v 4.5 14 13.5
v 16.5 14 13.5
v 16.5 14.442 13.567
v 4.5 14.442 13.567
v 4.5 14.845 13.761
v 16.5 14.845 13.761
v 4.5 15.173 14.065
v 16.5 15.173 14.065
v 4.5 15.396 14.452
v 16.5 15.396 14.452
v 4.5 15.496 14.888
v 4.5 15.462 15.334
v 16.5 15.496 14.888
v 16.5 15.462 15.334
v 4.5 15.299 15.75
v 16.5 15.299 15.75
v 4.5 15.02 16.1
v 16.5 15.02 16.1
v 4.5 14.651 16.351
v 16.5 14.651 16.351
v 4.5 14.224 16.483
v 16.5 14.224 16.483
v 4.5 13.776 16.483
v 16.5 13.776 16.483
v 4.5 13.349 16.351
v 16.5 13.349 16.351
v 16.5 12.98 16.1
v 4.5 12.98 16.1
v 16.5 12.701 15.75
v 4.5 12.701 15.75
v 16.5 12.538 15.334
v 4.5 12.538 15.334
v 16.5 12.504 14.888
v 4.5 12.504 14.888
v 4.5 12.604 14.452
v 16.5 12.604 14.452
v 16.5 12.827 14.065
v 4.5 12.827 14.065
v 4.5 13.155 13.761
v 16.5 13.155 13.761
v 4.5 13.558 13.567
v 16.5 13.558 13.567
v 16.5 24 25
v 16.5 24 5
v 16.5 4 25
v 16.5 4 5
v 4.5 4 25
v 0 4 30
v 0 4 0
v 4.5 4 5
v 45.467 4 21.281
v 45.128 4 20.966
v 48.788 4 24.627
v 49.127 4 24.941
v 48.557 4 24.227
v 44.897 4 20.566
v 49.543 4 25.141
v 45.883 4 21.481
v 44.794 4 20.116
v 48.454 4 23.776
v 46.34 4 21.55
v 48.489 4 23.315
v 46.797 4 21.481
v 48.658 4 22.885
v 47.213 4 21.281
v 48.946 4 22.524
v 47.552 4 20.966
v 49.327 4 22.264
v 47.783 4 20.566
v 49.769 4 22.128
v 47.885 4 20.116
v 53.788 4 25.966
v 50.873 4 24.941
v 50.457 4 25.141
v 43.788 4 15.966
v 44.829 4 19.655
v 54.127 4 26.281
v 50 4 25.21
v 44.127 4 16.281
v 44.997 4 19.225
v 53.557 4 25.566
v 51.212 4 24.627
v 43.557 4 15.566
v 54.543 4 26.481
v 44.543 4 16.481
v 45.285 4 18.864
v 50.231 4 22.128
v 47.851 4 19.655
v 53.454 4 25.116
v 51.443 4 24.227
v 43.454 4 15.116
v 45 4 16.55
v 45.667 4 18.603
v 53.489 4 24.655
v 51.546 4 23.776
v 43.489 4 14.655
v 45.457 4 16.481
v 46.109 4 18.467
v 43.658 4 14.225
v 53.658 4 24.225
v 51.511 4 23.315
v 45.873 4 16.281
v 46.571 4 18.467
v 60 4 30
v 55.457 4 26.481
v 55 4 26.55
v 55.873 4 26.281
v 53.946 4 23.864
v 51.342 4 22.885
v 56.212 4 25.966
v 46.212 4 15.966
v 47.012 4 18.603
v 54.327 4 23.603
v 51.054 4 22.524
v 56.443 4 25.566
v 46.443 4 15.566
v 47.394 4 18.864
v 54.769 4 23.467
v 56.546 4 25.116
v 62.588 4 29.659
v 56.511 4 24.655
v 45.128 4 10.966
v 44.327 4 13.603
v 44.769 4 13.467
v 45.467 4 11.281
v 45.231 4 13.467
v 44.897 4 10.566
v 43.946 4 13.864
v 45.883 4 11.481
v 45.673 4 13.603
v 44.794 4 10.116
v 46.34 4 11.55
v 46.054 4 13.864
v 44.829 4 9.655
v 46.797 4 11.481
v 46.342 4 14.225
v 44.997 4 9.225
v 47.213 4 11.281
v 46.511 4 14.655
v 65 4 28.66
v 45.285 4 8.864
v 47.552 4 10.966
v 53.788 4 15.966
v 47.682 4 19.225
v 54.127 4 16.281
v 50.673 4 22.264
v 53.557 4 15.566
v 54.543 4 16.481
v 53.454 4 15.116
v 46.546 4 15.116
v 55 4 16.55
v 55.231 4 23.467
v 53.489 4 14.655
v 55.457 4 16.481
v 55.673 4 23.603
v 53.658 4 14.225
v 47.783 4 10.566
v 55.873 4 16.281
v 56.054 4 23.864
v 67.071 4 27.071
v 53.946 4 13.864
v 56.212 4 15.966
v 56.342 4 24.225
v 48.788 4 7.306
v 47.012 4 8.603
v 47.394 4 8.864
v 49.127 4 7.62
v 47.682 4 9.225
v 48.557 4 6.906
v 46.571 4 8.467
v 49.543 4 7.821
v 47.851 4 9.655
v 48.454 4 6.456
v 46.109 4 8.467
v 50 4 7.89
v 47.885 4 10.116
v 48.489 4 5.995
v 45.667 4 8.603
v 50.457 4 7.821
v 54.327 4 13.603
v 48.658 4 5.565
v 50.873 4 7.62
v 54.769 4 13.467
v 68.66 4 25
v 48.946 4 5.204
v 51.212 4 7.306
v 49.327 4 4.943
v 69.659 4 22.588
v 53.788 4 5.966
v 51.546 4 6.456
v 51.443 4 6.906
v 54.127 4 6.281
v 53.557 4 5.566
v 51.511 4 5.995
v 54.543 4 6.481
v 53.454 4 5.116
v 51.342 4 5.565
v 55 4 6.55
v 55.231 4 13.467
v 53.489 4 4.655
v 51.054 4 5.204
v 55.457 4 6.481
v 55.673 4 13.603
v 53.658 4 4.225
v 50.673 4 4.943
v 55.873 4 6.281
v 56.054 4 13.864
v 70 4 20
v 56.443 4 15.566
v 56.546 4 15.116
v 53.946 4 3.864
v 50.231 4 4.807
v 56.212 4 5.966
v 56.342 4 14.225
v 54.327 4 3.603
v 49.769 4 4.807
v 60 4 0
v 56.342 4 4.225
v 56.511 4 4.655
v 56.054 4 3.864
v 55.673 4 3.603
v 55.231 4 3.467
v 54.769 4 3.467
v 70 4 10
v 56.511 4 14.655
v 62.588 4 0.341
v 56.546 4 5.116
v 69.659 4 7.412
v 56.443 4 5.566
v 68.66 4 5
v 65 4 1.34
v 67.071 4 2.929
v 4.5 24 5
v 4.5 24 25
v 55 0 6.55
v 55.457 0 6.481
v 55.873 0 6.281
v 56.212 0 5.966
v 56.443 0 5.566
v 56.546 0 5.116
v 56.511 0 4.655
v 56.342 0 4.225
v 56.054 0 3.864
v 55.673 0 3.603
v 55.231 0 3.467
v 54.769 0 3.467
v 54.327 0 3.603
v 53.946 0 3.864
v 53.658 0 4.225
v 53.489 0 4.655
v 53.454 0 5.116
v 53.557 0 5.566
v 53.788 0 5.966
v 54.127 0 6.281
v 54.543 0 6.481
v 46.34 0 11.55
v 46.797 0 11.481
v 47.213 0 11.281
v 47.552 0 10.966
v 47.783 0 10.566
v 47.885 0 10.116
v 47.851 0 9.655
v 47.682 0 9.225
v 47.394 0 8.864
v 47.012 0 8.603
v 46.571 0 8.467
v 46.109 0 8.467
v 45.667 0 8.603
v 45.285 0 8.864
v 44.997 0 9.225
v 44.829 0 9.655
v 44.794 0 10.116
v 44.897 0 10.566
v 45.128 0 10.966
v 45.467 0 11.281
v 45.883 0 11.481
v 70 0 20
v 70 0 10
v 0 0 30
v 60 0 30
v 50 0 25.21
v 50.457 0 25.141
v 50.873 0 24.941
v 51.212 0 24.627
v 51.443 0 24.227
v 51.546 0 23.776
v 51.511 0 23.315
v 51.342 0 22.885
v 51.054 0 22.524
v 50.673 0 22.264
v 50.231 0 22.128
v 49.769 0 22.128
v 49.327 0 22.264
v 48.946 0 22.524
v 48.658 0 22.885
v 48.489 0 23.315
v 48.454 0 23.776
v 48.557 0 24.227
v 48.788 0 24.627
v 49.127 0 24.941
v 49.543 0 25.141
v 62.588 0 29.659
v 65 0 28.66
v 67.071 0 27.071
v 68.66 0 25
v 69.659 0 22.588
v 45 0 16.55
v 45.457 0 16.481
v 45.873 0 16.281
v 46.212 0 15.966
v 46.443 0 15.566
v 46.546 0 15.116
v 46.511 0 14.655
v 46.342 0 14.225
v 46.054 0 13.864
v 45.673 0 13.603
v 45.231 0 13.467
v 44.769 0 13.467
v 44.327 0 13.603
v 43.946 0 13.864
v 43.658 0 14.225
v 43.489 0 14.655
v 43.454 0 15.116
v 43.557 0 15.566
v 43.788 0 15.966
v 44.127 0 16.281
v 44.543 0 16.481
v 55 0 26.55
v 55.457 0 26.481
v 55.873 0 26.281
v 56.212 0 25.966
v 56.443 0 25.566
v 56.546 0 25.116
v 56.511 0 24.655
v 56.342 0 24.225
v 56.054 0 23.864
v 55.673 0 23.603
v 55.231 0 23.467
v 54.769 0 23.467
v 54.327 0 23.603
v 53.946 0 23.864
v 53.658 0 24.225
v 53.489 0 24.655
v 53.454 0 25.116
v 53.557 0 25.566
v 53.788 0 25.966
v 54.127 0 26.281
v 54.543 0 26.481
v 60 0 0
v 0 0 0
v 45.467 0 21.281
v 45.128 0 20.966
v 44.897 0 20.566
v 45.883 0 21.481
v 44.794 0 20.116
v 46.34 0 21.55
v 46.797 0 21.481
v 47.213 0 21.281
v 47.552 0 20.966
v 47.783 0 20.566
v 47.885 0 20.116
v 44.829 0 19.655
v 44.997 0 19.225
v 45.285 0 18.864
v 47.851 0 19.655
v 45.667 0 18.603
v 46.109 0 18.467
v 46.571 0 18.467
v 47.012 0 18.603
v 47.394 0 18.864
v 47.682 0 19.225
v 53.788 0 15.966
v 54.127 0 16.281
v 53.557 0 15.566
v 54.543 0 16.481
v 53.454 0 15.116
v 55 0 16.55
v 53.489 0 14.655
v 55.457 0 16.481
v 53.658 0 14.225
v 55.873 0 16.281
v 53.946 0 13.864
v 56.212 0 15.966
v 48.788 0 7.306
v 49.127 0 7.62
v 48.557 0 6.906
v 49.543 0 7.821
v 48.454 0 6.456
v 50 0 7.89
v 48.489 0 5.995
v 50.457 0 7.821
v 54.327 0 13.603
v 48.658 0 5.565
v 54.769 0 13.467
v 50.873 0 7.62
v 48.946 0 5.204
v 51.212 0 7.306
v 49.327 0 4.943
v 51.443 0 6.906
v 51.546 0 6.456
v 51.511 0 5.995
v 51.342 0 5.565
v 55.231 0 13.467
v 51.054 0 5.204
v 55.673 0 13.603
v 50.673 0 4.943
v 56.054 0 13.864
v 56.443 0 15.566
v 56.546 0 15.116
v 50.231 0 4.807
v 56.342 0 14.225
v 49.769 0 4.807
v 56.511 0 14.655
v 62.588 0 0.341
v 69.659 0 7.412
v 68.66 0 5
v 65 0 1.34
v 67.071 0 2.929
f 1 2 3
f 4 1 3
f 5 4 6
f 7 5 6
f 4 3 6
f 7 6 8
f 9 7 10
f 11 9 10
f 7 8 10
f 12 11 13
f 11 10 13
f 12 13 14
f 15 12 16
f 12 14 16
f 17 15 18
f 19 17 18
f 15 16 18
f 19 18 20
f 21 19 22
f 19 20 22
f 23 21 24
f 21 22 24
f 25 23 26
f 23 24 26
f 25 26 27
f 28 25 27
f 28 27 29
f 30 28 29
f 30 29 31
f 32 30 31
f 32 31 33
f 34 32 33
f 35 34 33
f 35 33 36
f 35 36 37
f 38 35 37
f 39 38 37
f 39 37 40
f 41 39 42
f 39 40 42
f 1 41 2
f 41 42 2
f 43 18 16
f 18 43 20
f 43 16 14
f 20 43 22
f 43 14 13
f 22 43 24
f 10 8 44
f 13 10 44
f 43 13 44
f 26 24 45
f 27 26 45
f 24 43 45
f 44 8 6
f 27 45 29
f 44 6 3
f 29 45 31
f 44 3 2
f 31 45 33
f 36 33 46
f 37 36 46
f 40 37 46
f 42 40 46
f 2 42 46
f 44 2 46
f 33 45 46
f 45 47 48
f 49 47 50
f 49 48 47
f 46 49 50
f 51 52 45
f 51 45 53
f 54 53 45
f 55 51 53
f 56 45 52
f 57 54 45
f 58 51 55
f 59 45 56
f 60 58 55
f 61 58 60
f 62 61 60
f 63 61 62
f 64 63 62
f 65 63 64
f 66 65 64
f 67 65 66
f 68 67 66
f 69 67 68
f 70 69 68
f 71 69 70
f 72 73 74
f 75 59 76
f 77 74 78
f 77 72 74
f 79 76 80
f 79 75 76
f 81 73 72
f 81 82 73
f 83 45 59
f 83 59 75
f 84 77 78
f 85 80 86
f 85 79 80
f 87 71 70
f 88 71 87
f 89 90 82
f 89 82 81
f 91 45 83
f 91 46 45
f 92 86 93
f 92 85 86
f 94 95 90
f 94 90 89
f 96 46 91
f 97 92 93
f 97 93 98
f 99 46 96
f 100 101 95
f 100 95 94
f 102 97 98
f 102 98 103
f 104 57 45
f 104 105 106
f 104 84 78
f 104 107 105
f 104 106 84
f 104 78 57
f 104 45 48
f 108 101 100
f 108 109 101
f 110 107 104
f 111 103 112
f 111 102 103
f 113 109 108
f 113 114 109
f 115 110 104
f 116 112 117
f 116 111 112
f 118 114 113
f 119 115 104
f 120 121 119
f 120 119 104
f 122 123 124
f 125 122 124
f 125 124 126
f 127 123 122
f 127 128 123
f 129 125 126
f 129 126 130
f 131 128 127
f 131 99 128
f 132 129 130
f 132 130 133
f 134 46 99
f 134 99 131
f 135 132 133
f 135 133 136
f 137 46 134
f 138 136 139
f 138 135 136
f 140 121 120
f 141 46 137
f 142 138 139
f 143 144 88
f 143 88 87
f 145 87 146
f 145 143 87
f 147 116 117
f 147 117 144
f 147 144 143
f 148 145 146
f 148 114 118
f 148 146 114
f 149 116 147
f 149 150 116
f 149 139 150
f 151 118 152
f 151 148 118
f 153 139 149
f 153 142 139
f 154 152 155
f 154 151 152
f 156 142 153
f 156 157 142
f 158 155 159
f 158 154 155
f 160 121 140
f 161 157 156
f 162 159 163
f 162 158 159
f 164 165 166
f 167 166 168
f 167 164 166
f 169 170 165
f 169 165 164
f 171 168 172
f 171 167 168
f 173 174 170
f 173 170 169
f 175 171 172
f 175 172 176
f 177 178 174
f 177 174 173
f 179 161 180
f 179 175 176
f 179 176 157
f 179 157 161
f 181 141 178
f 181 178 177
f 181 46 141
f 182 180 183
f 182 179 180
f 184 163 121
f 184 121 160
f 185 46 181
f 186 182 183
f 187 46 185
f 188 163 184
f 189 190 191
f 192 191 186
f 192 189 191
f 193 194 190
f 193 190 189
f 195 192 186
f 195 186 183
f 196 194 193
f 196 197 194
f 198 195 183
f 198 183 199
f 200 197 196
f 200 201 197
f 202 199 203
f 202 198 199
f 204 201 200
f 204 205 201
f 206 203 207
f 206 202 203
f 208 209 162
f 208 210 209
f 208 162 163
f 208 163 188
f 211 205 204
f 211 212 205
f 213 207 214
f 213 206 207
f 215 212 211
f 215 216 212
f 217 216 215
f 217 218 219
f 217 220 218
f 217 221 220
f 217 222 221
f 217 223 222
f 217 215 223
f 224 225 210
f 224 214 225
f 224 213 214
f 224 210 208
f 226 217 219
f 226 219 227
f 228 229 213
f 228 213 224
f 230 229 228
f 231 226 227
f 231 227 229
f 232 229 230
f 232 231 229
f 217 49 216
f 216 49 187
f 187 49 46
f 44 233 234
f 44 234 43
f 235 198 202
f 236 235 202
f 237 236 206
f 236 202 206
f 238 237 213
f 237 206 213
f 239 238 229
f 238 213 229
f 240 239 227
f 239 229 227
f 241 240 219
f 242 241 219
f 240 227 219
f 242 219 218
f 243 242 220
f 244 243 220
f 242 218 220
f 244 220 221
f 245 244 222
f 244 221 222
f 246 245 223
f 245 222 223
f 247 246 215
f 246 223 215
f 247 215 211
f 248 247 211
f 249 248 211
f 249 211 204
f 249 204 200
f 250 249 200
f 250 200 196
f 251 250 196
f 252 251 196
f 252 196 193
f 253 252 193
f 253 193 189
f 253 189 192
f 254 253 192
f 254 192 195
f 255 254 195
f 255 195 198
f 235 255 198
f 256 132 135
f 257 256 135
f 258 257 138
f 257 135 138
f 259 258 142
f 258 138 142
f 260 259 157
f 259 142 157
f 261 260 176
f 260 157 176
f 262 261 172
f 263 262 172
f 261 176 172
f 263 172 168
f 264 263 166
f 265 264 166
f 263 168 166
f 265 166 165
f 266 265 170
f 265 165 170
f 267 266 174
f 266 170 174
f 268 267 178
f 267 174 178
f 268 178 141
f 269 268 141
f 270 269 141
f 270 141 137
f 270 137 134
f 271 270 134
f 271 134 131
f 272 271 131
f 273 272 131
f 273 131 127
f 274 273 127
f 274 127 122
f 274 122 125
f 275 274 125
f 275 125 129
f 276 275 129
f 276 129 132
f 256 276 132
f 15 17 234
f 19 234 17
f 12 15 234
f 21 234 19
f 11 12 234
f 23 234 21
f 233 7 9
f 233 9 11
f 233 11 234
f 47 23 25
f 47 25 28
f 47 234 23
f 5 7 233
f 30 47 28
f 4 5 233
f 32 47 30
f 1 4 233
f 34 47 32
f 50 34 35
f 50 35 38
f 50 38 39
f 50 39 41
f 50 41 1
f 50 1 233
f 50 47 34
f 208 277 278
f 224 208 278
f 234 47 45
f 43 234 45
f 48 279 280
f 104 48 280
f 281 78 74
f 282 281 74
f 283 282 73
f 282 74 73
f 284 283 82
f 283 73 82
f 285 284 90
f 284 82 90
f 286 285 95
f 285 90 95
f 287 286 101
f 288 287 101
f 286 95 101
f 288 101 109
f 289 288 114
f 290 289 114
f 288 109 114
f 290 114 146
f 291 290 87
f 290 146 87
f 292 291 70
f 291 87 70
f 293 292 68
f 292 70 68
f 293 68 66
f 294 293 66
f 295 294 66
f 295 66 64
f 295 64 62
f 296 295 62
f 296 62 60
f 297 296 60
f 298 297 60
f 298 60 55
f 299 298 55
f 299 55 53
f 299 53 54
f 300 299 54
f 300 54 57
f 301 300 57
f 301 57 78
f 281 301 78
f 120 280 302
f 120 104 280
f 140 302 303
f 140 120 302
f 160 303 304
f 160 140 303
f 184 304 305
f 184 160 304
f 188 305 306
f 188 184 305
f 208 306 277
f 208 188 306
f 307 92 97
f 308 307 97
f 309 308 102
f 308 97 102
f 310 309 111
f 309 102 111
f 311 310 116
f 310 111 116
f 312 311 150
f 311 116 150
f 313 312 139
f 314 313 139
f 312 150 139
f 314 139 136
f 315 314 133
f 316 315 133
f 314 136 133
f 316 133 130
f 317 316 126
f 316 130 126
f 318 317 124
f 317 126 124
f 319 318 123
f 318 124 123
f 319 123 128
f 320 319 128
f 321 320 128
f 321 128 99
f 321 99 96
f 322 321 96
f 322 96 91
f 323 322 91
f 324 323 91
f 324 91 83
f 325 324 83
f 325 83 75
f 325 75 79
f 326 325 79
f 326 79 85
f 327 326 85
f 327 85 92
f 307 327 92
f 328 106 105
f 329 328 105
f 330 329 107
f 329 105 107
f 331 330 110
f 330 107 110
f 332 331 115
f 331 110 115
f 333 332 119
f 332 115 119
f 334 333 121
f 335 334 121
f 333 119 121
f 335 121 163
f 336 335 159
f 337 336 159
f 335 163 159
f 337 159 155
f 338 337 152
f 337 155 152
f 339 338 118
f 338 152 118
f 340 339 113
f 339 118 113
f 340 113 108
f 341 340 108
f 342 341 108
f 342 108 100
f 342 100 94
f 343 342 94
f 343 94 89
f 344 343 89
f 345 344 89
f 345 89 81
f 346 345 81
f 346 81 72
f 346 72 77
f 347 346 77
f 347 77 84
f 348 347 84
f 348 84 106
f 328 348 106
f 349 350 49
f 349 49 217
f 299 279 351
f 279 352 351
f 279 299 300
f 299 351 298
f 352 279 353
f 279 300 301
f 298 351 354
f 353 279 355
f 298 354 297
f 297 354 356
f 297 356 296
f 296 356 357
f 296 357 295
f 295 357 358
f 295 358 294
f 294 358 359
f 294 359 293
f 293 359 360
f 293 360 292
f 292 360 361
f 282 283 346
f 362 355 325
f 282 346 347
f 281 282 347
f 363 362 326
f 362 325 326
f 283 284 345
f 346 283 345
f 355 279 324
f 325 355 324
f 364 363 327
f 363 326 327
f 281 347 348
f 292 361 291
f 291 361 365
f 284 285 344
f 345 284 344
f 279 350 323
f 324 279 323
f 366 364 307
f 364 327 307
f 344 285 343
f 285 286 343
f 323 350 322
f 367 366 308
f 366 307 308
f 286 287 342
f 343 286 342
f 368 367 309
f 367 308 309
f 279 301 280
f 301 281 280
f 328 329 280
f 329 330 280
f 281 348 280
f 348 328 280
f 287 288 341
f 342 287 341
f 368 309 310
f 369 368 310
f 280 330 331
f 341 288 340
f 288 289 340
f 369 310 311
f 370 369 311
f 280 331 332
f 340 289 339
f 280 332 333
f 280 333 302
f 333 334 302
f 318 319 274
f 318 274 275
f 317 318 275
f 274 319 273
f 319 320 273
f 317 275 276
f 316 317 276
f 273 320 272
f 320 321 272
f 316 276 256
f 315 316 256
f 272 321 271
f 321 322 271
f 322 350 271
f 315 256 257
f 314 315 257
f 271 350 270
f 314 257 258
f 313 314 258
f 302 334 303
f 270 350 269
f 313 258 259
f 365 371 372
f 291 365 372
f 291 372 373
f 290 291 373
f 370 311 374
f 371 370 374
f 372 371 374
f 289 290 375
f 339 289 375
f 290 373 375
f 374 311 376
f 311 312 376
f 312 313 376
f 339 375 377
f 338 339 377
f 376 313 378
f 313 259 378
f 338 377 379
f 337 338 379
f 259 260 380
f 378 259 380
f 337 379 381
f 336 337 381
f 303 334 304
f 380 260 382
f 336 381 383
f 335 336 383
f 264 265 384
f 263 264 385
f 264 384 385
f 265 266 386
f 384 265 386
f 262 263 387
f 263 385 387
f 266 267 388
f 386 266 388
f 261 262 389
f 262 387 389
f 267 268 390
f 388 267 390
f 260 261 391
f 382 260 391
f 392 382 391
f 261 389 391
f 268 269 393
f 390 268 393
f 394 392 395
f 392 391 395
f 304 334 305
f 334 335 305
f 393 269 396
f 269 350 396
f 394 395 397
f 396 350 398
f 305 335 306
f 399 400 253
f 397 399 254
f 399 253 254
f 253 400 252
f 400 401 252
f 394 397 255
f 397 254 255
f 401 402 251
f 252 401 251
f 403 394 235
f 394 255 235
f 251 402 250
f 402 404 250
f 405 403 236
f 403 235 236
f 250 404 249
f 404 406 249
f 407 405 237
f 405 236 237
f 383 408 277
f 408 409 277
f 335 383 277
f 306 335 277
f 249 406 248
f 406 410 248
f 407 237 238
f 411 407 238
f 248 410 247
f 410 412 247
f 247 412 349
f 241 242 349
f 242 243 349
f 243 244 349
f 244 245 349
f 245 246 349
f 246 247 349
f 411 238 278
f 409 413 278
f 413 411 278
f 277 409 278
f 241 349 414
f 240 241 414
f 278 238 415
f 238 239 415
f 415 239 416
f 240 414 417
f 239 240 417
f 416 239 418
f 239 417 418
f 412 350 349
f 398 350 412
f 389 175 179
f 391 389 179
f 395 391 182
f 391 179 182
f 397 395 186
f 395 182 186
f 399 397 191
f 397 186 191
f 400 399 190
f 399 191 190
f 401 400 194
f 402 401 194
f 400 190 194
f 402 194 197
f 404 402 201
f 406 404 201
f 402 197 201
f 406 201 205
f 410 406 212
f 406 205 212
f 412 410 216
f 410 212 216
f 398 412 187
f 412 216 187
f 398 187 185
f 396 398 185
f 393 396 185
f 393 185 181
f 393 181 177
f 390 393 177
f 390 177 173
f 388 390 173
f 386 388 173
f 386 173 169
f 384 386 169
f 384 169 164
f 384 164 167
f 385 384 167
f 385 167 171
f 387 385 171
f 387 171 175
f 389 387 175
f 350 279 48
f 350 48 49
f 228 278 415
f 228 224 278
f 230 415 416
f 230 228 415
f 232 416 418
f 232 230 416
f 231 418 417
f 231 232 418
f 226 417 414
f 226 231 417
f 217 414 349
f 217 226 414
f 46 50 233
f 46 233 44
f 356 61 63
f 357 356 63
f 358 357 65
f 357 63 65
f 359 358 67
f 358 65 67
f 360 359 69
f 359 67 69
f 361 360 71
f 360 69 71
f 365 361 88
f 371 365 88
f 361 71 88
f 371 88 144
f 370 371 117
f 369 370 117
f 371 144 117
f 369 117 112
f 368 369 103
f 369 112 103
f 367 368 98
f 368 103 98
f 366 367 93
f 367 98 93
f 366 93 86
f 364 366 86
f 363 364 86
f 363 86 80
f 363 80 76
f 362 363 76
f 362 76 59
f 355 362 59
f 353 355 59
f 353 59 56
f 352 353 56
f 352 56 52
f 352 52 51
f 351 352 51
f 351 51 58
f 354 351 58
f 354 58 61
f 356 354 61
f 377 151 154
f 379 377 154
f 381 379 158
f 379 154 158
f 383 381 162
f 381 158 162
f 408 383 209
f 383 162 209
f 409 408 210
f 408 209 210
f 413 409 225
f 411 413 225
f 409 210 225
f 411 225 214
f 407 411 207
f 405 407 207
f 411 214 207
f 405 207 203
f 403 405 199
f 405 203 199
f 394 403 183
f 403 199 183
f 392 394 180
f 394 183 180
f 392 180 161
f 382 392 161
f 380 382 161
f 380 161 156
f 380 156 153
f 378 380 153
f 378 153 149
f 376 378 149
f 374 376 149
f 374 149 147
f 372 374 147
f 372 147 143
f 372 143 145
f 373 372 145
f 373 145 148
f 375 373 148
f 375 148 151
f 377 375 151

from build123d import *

# Parameters (mm, degrees)
SKETCH_1_W          = 70
SKETCH_1_H          = 30
EXTRUDE_1_DEPTH     = 4
SKETCH_2_W          = 12
SKETCH_2_H          = 20
EXTRUDE_2_DEPTH     = 20
SKETCH_7_R          = 1.5
CUT_EXTRUDE_2_DEPTH = 12
SKETCH_11_R         = 1.55
CUT_EXTRUDE_4_DEPTH = 50
FILLET_1_R          = 10
FILLET_2_R          = 10


with BuildPart() as part:
    # 草图1 → 凸台-拉伸1 (new body)
    with BuildSketch(Plane(origin=(0, 0, 0), x_dir=(1, 0, 0), z_dir=(0, 1, 0))):
        with Locations((35, -15)):
            Rectangle(SKETCH_1_W, SKETCH_1_H)
    extrude(amount=EXTRUDE_1_DEPTH)

    # 草图2 → 凸台-拉伸2 (add)
    with BuildSketch(Plane(origin=(0, 4, 0), x_dir=(1, 0, 0), z_dir=(0, 1, 0))):
        with Locations((10.5, -15)):
            Rectangle(SKETCH_2_W, SKETCH_2_H)
    extrude(amount=EXTRUDE_2_DEPTH)

    # 草图7 → 切除-拉伸2 (cut)
    with BuildSketch(Plane(origin=(16.5, 0, 0), x_dir=(0, 0, -1), z_dir=(1, 0, 0))):
        with Locations((-15, 14)):
            Circle(SKETCH_7_R)
    extrude(amount=-CUT_EXTRUDE_2_DEPTH, mode=Mode.SUBTRACT)

    # 草图11 → 切除-拉伸4 (cut)
    with BuildSketch(Plane(origin=(0, 4, 0), x_dir=(1, 0, 0), z_dir=(0, 1, 0))):
        with Locations(Location((55, -15, 0), (0, 0, 270))):
            Circle(SKETCH_11_R)
        with Locations(Location((50, -23.660254038, 0), (0, 0, 270))):
            Circle(SKETCH_11_R)
        with Locations(Location((46.339745962, -20, 0), (0, 0, 270))):
            Circle(SKETCH_11_R)
        with Locations(Location((46.339745962, -10, 0), (0, 0, 270))):
            Circle(SKETCH_11_R)
        with Locations(Location((50, -6.339745962, 0), (0, 0, 270))):
            Circle(SKETCH_11_R)
        with Locations(Location((45, -15, 0), (0, 0, 270))):
            Circle(SKETCH_11_R)
        with Locations(Location((55, -5, 0), (0, 0, 270))):
            Circle(SKETCH_11_R)
        with Locations(Location((55, -25, 0), (0, 0, 270))):
            Circle(SKETCH_11_R)
    extrude(amount=-CUT_EXTRUDE_4_DEPTH, mode=Mode.SUBTRACT)

    # 圆角1
    fillet_1_edges = [part.edges().sort_by_distance(p)[0] for p in [
        (70, 2, 30),
    ]]
    fillet(fillet_1_edges, radius=FILLET_1_R)

    # 圆角2
    fillet_2_edges = [part.edges().sort_by_distance(p)[0] for p in [
        (70, 2, 0),
    ]]
    fillet(fillet_2_edges, radius=FILLET_2_R)


solid = part.part
